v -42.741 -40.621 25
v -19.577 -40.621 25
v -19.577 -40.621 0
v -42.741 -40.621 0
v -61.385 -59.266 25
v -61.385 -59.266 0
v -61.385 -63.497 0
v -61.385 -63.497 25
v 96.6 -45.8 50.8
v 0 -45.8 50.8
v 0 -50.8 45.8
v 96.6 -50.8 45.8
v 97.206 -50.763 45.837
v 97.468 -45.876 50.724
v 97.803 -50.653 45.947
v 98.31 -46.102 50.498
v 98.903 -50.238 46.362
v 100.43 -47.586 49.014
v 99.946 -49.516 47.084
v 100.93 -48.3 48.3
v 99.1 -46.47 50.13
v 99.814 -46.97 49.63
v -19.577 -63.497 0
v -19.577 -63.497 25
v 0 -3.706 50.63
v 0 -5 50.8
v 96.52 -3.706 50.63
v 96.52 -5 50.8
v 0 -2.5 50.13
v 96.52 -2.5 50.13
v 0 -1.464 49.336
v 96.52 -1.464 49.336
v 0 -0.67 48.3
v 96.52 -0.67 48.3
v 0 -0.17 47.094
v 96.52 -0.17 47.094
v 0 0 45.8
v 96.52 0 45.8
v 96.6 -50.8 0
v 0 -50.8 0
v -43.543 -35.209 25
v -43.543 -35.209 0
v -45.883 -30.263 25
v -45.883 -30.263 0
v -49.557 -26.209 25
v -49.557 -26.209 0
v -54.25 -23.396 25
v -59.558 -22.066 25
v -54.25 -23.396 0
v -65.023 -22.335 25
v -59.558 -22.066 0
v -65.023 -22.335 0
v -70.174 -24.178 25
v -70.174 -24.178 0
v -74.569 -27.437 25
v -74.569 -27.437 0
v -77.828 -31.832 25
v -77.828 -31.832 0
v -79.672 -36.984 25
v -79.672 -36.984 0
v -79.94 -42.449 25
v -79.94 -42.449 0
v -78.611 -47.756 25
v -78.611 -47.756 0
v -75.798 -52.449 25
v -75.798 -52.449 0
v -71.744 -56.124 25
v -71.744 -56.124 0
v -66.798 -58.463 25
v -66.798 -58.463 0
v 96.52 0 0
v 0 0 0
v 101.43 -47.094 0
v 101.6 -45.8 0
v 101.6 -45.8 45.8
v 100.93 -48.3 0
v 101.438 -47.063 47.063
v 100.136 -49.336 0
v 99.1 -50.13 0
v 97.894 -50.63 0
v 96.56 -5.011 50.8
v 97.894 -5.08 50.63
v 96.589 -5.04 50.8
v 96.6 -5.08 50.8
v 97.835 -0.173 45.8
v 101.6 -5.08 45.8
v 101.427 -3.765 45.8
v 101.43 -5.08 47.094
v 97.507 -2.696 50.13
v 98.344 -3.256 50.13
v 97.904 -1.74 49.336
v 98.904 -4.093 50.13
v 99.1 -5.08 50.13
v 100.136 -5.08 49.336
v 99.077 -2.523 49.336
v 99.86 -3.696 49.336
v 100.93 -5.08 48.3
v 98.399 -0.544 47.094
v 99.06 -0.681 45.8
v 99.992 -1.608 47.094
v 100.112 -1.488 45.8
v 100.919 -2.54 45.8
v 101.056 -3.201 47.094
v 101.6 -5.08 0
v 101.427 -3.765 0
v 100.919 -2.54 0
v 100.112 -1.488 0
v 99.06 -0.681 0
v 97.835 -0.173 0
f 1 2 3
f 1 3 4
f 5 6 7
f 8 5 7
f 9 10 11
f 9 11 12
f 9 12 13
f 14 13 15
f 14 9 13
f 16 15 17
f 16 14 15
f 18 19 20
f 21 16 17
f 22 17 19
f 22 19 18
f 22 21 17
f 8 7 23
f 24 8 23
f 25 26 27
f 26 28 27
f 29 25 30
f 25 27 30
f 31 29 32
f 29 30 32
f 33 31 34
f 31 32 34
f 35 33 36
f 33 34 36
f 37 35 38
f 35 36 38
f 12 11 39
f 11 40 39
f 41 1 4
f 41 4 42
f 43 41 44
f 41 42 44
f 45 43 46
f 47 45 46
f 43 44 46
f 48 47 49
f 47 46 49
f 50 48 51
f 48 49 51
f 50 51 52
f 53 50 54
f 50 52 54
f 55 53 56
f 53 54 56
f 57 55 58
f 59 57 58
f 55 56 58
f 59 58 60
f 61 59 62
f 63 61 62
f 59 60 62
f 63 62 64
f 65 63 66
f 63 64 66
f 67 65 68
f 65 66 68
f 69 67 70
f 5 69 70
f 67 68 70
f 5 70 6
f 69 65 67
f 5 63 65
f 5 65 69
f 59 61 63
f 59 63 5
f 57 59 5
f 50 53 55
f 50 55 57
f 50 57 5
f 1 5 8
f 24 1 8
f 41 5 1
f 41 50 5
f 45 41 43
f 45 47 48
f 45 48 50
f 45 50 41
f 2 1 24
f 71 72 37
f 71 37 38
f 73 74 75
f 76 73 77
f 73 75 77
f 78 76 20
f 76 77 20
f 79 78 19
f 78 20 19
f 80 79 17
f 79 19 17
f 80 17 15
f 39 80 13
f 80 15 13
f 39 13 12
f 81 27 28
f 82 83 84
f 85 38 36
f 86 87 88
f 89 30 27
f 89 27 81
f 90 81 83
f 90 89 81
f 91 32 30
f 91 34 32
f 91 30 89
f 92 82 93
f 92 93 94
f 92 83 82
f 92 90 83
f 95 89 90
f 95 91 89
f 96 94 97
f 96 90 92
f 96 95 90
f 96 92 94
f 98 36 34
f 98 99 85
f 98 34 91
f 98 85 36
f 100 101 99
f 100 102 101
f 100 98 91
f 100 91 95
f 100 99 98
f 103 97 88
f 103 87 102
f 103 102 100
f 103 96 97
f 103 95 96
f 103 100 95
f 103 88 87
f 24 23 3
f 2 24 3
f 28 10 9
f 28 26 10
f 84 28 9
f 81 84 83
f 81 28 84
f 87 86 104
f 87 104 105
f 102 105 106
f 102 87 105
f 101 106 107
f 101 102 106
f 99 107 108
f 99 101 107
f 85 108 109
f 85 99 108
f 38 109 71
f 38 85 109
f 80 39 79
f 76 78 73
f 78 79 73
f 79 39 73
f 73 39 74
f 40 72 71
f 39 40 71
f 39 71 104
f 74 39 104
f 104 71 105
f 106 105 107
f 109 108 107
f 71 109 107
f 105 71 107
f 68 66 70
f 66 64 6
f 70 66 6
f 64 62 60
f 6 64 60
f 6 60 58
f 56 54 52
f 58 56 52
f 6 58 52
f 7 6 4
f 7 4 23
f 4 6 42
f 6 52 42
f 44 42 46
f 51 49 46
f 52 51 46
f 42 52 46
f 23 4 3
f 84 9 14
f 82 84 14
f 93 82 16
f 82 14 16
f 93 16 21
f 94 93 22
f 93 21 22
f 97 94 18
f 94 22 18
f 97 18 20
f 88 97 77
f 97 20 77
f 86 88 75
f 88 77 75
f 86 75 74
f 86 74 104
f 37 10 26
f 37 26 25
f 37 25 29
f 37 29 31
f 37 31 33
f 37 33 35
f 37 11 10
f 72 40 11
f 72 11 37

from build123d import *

# Parameters (mm, degrees)
F0_W     = 101.6
F0_H     = 50.8
F1_DEPTH = 50.8
F2_R     = 5.08
F4_DEPTH = 25
F5_SIZE  = 5
F6_R     = 5
F7_R     = 4.99999


# Not quite as in the source:
# - a fillet or chamfer is up to 0.001 mm smaller than in the source, because OpenCascade refuses the exact size


with BuildPart() as f1:
    # F0 (on Top) → F1 (new body)
    with BuildSketch(Plane.XY):
        with Locations((50.8, -25.4)):
            Rectangle(F0_W, F0_H)
    extrude(amount=F1_DEPTH)

    # F2
    f2_edges = [f1.edges().sort_by_distance(p)[0] for p in [
        (101.6, 0, 25.4),
    ]]
    fillet(f2_edges, radius=F2_R)

    # F5
    f5_edges = [f1.edges().sort_by_distance(p)[0] for p in [
        (50.8, -50.8, 50.8),
    ]]
    chamfer(f5_edges, length=F5_SIZE)

    # F6
    f6_edges = [f1.edges().sort_by_distance(p)[0] for p in [
        (48.26, 0, 50.8),
    ]]
    fillet(f6_edges, radius=F6_R)

    # F7 (radius 5 in the source; OpenCascade refuses exactly that, so slightly less here)
    f7_edges = [f1.edges().sort_by_distance(p)[0] for p in [
        (101.6, -50.8, 22.9),
    ]]
    fillet(f7_edges, radius=F7_R)


with BuildPart() as f4:
    # F3 (on Top) → F4 (new body)
    with BuildSketch(Plane.XY):
        with BuildLine():
            Line((-61.385255307, -59.2657432558), (-61.385255307, -40.6210906804))
            Line((-61.385255307, -40.6210906804), (-42.7406027316, -40.6210906804))
            ThreePointArc((-42.7406027316, -40.6210906804), (-74.5690155759, -27.4373304114), (-61.385255307, -59.2657432558))
        make_face()
        with BuildLine():
            Line((-42.7406027316, -40.6210906804), (-61.385255307, -40.6210906804))
            Line((-61.385255307, -40.6210906804), (-61.385255307, -59.2657432558))
            ThreePointArc((-61.385255307, -59.2657432558), (-48.201495038, -53.8048509493), (-42.7406027316, -40.6210906804))
        make_face()
        with BuildLine():
            Line((-19.57654953, -40.6210906804), (-42.7406027316, -40.6210906804))
            ThreePointArc((-42.7406027316, -40.6210906804), (-48.201495038, -53.8048509493), (-61.385255307, -59.2657432558))
            Line((-61.385255307, -59.2657432558), (-61.385255307, -63.4969770908))
            Line((-61.385255307, -63.4969770908), (-19.57654953, -63.4969770908))
            Line((-19.57654953, -63.4969770908), (-19.57654953, -40.6210906804))
        make_face()
    extrude(amount=F4_DEPTH)


solid = Compound([f1.part, f4.part])
